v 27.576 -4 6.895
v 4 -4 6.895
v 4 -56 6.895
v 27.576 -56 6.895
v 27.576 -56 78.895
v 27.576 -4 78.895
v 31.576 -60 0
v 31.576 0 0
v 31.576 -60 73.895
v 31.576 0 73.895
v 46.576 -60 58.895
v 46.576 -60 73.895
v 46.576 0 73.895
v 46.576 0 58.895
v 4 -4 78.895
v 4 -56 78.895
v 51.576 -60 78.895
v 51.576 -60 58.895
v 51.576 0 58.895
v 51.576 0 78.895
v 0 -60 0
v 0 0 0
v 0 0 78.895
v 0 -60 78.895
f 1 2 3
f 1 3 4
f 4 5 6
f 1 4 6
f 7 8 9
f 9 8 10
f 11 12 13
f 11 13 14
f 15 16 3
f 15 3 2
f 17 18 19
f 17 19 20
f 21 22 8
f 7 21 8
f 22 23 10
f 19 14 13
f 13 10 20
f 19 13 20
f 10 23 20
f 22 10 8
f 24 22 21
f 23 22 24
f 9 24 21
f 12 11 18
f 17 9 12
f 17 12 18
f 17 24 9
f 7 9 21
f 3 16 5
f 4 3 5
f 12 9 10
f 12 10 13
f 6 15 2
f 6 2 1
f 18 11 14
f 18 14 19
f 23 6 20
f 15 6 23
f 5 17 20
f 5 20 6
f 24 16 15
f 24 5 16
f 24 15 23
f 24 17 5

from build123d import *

# Parameters (mm, degrees)
F0_W     = 31.5761379898
F0_H     = 78.8946151733
F1_DEPTH = 60
F2_W     = 23.5761379898
F2_H     = 52
F3_DEPTH = 72
F5_DEPTH = 60


with BuildPart() as f1:
    # F0 (on Front) → F1 (new body)
    with BuildSketch(Plane.XZ):
        with Locations((15.7880689949, 39.4473075867)):
            Rectangle(F0_W, F0_H)
    extrude(amount=F1_DEPTH)

    # F2 (on face) → F3 (cut)
    with BuildSketch(Plane.XY.offset(78.8946151733)):
        with Locations((15.7880689949, -30)):
            Rectangle(F2_W, F2_H)
    extrude(amount=-F3_DEPTH, mode=Mode.SUBTRACT)

    # F4 (on face) → F5 (join)
    with BuildSketch(Plane.XZ.offset(60)):
        Polygon((51.5761379898, 78.8946151733), (31.5761379898, 78.8946151733), (31.5761379898, 73.8946151733), (46.5761379898, 73.8946151733), (46.5761379898, 58.8946151733), (51.5761379898, 58.8946151733), align=None)
    extrude(amount=-F5_DEPTH)


solid = f1.part
